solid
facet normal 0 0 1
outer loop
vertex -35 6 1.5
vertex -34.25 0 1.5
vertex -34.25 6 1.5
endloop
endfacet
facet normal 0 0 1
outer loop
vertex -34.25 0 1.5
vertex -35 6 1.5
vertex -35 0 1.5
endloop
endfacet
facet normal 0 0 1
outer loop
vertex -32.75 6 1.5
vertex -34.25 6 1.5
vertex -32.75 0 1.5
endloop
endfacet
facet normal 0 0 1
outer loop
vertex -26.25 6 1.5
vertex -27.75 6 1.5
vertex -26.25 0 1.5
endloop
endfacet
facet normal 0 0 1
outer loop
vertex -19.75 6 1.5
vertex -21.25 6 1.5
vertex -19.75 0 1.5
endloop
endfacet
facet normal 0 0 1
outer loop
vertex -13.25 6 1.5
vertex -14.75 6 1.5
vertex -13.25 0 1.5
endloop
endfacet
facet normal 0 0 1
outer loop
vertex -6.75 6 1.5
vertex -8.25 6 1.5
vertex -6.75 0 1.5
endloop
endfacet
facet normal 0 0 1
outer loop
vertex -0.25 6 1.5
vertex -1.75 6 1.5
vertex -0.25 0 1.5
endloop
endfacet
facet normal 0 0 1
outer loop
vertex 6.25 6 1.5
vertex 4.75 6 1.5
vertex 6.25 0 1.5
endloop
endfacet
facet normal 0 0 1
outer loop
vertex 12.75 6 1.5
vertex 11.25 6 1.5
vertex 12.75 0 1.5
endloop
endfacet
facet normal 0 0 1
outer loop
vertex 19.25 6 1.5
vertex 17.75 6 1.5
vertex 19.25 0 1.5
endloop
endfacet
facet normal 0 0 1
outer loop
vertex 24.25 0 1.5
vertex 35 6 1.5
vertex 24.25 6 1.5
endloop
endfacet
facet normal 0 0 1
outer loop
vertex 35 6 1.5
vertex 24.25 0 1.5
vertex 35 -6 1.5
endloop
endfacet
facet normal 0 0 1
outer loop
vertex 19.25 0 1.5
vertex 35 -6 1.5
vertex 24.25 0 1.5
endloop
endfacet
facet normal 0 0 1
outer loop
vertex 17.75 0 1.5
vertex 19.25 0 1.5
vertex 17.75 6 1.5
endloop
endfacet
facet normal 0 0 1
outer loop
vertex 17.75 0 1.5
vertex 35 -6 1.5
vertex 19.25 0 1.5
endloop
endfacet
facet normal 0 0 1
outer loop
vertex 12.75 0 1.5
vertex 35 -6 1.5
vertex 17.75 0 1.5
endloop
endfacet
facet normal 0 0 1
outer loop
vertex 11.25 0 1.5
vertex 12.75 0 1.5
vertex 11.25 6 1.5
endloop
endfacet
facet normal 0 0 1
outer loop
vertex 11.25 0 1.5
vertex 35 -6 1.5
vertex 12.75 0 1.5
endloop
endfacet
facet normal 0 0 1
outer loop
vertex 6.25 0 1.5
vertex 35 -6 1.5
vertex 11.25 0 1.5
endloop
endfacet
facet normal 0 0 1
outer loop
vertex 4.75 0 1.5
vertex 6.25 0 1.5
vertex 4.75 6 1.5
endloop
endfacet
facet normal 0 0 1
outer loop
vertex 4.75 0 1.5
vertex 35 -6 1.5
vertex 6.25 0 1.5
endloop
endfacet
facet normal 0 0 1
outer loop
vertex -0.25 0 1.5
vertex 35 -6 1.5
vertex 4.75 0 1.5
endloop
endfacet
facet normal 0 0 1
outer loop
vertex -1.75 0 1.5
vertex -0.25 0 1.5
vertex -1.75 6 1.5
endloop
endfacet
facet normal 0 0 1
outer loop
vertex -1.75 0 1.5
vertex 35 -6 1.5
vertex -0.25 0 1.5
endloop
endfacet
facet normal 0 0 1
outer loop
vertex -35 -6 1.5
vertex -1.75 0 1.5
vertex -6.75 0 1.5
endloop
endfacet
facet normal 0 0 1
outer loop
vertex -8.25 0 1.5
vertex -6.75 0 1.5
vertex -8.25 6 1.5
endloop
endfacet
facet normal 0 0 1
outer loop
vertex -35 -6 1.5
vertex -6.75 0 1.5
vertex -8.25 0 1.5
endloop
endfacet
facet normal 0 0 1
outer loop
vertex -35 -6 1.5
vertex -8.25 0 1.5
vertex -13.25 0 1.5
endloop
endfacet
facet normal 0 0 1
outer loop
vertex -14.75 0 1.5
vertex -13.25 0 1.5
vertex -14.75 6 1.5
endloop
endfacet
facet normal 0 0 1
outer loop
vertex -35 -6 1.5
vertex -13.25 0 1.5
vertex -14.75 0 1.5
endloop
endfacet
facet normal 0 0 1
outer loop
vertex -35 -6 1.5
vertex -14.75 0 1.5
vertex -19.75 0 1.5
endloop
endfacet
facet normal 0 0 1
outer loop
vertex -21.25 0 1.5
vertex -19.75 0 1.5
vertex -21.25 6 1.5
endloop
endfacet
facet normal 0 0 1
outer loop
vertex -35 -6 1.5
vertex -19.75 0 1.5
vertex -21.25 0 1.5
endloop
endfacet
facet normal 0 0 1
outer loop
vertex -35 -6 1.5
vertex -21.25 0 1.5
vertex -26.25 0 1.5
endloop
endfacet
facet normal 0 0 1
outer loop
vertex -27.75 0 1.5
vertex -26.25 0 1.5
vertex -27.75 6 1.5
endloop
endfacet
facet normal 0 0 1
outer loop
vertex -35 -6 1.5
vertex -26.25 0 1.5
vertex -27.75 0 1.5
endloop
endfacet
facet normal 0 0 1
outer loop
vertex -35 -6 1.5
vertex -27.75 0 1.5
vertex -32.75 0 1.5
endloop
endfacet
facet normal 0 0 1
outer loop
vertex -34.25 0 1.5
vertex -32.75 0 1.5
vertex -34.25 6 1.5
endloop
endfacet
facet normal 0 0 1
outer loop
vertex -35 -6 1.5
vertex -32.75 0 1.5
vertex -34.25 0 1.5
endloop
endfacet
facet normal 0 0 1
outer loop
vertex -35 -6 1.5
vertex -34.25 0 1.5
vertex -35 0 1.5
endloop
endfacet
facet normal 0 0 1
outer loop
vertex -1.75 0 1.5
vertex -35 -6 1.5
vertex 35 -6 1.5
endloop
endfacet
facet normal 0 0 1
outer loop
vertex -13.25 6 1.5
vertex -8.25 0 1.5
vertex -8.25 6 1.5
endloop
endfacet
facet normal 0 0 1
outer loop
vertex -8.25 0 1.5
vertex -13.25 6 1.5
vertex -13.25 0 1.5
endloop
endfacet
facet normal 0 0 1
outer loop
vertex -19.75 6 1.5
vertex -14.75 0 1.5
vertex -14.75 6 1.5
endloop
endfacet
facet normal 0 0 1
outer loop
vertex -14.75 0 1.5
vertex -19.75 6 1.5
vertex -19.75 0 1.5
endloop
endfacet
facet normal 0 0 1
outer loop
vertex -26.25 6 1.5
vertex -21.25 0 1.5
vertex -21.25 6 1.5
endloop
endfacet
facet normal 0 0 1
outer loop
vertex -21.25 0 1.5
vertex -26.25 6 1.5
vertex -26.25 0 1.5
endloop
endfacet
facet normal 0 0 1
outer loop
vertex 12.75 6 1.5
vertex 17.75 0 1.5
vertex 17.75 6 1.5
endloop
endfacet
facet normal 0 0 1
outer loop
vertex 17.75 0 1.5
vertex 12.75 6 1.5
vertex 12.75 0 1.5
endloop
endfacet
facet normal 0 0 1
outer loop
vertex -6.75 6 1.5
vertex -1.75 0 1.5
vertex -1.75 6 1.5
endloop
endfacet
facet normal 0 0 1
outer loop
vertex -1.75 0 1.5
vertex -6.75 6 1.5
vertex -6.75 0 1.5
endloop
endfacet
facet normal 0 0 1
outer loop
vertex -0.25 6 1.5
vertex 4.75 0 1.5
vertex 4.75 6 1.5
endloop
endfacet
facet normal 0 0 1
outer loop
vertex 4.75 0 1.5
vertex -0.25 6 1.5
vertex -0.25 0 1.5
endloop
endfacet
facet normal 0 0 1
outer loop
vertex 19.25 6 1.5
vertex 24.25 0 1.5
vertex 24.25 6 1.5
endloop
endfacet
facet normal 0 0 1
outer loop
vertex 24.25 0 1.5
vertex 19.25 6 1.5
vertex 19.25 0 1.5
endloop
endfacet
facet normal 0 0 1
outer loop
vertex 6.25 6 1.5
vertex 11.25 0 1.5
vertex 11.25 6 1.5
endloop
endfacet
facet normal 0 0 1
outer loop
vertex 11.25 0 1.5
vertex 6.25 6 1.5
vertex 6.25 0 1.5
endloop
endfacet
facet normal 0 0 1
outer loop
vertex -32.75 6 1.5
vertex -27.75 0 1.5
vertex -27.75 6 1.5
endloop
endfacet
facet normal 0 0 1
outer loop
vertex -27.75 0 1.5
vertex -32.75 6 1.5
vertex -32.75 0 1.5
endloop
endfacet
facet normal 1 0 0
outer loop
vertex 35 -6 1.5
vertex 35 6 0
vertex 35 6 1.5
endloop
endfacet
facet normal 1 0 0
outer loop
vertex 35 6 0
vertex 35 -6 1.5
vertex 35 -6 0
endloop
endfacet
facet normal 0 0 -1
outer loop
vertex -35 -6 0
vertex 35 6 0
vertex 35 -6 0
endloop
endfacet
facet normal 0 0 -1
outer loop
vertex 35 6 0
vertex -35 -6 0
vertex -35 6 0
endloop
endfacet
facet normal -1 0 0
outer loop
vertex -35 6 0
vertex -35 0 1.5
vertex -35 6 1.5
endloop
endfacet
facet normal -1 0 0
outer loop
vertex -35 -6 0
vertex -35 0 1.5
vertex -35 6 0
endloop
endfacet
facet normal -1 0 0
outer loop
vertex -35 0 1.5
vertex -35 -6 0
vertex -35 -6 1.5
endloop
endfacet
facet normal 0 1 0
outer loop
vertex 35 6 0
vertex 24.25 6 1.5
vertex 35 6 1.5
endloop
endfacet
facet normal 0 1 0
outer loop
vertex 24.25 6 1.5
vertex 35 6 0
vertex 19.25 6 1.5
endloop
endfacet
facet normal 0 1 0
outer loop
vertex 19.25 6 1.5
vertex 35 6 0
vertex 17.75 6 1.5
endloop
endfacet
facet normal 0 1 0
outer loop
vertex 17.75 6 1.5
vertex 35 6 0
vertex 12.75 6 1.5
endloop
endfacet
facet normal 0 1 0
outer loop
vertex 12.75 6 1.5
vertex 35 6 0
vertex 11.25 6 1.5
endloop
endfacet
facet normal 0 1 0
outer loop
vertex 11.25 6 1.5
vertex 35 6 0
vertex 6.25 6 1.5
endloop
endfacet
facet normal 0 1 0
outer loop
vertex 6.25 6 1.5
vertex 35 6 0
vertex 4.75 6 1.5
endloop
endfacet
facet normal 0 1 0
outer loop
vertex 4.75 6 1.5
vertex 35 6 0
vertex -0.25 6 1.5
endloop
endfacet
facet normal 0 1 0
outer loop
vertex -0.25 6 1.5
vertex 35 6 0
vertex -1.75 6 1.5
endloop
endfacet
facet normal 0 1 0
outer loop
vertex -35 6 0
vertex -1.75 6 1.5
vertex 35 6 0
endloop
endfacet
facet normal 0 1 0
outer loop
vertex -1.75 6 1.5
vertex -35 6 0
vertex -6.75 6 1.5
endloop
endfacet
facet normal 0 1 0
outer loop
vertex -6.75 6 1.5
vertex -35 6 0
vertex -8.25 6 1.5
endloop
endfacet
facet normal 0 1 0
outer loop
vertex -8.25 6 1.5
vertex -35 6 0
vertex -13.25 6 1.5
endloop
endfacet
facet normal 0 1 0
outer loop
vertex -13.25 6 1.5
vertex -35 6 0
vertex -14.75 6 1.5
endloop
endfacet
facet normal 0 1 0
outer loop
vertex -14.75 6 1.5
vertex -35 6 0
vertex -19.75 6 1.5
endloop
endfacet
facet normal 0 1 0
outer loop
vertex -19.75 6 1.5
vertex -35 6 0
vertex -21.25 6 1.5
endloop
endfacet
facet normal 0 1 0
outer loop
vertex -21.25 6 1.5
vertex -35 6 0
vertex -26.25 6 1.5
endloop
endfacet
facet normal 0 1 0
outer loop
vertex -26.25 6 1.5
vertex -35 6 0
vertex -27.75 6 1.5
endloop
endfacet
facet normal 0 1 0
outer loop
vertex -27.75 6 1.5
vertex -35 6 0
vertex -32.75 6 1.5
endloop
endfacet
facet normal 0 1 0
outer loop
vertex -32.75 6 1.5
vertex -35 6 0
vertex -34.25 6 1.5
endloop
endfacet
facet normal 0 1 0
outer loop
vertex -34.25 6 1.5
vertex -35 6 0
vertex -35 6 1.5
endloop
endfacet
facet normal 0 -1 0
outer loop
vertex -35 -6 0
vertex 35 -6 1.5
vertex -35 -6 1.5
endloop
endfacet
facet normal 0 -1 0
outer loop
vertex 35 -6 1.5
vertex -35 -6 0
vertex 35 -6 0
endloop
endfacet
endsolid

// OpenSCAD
// 10-well comb for agarose gel casting, printed lying flat
// Units: mm

// ---- Spine ----
spine_len   = 70;    // spine length along X
spine_wid   = 12;    // spine width along Y
plate_thk   = 1.5;   // plate thickness (Z)

// ---- Teeth ----
tooth_count = 10;    // number of wells
tooth_w     = 5.0;   // tooth width along X
tooth_l     = 12;    // tooth length along Y (from top edge of spine)
gap         = 1.5;   // gap between neighbouring teeth

// ---- Misc ----
eps         = 0.5;   // cutter overshoot past faces
$fn         = 64;

// Derived
pitch       = tooth_w + gap;                 // centre-to-centre spacing
row_span    = (tooth_count - 1) * gap;       // total gap width
x_start     = -spine_len/2 + tooth_w/2 - row_span/2; // first tooth centre X

difference() {
    // Base plate
    translate([-spine_len/2, -spine_wid/2, 0])
        cube([spine_len, spine_wid, plate_thk]);

    // Teeth cut out from the top edge, hanging in -Y
    for (i = [0 : tooth_count - 1]) {
        translate([x_start + i * pitch, 0, plate_thk])
            cube([tooth_w, tooth_l + eps, eps]);
    }
}
